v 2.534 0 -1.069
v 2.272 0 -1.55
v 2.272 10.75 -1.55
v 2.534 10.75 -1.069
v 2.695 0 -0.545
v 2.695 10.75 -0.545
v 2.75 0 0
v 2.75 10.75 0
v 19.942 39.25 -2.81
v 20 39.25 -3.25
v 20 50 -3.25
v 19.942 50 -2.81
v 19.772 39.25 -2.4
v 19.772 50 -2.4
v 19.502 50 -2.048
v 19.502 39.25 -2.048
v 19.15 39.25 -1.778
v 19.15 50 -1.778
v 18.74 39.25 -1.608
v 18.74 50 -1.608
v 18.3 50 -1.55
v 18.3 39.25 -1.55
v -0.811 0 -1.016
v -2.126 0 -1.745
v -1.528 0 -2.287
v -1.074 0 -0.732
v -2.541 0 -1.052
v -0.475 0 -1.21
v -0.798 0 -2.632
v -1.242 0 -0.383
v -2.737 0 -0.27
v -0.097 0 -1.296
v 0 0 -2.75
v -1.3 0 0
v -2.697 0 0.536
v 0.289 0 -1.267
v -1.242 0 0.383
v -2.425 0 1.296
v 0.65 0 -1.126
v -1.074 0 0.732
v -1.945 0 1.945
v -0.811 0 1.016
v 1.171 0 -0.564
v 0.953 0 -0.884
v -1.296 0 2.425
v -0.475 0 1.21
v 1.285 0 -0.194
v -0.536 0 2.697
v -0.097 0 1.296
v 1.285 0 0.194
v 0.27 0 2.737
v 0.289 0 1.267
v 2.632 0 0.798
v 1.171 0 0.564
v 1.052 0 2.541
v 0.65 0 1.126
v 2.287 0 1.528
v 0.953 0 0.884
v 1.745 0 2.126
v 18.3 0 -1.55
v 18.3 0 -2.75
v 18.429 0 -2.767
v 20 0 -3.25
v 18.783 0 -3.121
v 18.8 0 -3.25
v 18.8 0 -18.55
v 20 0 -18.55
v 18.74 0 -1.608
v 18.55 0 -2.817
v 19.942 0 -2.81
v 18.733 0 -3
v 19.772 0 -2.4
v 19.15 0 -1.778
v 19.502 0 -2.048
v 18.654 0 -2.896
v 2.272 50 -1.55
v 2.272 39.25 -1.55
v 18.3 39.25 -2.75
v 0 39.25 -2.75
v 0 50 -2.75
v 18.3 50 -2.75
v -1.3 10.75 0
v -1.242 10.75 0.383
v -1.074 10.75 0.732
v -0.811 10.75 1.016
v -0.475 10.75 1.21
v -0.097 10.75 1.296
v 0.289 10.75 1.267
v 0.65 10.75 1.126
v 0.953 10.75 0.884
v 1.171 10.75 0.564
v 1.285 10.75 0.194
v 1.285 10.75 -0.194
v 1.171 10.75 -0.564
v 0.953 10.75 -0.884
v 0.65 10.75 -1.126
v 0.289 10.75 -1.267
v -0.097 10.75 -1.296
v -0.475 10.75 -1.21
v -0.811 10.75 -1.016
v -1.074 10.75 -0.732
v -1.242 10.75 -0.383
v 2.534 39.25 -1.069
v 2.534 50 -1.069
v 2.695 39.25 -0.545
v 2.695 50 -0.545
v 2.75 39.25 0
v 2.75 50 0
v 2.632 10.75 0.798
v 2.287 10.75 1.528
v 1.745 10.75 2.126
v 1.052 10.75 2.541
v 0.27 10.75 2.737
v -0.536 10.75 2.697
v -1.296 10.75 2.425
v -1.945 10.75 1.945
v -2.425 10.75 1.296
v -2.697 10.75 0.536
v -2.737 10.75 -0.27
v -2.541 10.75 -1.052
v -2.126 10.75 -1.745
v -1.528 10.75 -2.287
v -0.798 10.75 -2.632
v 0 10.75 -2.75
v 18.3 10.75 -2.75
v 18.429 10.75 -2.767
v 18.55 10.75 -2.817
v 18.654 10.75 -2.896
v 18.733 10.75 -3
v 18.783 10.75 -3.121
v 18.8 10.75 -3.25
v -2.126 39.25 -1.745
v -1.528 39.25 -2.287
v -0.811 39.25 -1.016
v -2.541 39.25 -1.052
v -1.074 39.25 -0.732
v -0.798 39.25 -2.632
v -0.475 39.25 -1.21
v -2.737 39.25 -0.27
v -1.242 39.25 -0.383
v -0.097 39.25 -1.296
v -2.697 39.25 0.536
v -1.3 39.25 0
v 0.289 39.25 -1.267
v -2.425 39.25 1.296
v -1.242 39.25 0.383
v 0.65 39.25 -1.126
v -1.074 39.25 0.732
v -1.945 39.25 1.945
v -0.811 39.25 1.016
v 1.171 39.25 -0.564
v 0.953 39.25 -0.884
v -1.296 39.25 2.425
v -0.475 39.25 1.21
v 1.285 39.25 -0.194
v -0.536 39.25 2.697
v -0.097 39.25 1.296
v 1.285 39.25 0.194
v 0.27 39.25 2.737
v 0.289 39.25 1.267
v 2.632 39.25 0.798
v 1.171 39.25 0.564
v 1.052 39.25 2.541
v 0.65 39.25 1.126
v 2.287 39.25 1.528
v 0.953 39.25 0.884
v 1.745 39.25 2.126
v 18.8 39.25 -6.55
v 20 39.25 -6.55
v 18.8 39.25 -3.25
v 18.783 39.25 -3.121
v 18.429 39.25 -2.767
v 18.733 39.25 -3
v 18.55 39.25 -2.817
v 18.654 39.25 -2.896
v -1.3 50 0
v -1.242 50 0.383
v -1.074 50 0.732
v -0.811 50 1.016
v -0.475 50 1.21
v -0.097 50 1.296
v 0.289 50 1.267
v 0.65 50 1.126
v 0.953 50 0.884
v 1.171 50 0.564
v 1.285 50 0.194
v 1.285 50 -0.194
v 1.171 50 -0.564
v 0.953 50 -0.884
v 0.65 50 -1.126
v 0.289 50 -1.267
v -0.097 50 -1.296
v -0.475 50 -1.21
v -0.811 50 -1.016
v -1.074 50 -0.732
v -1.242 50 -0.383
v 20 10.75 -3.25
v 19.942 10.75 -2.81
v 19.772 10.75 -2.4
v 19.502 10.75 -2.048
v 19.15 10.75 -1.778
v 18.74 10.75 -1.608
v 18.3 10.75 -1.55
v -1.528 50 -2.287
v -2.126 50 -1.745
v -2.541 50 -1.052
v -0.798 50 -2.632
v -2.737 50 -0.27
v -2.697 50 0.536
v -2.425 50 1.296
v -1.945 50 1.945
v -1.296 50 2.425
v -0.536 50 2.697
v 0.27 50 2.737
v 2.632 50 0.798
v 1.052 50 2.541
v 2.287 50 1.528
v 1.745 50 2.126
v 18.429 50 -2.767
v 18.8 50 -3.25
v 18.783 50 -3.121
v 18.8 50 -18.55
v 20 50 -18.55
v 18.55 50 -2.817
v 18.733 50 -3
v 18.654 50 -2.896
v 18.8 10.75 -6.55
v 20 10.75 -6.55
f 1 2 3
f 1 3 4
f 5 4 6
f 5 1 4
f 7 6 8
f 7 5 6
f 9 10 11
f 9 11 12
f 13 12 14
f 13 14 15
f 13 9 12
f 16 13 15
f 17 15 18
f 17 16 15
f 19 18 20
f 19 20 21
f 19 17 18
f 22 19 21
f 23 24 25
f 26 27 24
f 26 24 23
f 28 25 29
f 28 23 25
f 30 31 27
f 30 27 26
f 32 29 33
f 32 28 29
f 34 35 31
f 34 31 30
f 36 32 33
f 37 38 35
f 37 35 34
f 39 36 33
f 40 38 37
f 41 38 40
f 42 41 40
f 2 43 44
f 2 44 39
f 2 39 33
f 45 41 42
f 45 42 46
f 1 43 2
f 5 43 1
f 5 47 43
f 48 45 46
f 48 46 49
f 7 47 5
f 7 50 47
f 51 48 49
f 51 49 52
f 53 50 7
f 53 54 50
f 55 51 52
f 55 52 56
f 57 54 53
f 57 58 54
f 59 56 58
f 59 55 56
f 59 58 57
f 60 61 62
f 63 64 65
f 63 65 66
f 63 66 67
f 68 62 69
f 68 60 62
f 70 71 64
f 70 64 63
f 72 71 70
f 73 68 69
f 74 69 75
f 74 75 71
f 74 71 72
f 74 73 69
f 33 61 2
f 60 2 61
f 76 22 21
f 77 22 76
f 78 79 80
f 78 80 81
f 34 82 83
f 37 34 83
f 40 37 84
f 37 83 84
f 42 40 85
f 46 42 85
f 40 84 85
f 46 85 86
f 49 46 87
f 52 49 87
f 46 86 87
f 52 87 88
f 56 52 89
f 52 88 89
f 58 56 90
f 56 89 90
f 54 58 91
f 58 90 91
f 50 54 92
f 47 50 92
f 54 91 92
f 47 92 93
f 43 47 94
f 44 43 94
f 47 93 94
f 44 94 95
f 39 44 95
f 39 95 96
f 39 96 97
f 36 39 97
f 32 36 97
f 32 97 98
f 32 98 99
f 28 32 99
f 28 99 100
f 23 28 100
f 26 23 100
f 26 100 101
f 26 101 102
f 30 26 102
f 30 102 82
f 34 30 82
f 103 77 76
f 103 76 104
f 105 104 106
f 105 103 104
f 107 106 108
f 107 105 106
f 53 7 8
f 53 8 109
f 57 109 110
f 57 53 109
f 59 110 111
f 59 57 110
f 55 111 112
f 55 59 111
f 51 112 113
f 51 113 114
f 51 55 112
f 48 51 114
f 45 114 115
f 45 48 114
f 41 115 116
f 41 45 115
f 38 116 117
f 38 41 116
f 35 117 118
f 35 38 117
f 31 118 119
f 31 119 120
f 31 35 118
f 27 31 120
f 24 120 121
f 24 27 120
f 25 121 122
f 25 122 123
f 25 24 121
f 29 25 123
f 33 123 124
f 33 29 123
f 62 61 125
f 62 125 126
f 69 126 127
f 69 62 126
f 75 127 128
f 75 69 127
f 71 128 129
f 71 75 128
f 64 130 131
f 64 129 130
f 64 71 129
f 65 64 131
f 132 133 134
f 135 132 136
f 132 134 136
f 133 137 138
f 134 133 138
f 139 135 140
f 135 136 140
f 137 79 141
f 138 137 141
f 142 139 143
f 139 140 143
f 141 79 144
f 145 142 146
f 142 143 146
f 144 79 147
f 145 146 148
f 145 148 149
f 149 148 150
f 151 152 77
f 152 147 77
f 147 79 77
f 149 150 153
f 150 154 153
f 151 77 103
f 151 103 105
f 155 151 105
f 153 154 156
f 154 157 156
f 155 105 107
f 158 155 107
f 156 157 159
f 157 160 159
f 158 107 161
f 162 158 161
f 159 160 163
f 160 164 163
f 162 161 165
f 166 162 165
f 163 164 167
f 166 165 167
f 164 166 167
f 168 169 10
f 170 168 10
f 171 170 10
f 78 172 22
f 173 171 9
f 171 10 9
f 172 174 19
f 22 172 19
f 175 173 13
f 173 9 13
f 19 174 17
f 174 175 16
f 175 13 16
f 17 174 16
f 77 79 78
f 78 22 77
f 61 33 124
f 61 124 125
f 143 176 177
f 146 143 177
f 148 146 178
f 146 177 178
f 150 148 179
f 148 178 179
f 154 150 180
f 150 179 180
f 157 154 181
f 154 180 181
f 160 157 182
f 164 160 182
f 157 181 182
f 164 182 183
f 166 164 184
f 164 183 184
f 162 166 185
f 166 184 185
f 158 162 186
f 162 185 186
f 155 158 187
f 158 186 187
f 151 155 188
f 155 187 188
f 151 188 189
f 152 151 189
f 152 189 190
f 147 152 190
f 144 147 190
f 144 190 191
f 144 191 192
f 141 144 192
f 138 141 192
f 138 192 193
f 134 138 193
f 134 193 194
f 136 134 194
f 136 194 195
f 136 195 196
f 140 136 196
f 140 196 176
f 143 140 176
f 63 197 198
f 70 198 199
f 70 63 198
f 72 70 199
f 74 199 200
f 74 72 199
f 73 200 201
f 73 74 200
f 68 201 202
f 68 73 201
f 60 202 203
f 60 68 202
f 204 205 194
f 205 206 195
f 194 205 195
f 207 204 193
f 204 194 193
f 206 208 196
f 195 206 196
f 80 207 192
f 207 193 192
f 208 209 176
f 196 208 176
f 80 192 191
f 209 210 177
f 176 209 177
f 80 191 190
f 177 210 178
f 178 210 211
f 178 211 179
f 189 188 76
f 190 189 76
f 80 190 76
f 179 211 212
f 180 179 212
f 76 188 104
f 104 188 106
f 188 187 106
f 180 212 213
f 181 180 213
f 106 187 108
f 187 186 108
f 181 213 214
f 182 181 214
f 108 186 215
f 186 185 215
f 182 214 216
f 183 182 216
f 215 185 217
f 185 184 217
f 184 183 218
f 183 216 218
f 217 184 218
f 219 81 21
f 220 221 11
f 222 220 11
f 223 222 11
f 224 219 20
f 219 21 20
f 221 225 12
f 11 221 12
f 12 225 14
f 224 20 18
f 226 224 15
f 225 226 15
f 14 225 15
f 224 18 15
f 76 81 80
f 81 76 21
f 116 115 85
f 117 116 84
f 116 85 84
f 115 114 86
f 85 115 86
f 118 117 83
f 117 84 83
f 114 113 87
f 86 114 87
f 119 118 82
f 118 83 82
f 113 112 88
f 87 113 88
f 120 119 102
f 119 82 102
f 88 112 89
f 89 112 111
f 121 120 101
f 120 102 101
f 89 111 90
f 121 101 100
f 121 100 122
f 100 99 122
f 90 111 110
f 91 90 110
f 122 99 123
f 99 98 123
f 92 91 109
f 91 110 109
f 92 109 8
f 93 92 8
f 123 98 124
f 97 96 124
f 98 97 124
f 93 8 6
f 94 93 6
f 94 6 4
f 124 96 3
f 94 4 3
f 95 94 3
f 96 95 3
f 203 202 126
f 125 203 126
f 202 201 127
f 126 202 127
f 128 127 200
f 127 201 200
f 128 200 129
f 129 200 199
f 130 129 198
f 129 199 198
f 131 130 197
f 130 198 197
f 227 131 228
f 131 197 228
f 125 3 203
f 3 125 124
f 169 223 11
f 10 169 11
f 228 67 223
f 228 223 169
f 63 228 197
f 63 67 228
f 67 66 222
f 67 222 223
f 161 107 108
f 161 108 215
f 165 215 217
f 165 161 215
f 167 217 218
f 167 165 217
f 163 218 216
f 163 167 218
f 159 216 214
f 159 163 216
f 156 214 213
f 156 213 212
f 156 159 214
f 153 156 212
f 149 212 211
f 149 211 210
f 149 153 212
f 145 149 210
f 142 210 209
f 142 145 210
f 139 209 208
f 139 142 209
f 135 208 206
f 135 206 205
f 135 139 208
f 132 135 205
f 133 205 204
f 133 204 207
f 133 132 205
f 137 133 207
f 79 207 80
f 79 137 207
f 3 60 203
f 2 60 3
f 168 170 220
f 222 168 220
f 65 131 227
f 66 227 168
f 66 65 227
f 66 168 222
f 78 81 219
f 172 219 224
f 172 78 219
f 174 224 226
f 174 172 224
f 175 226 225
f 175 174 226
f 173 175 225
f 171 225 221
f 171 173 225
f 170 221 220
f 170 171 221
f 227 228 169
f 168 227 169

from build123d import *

# Parameters (mm, degrees)
F1_DEPTH = 50
F2_D     = 2.6
F3_W     = 28.5
F3_H     = 6.7
F3_H_2   = 3.3
F4_DEPTH = 25


with BuildPart() as f1:
    # F0 (on Front) → F1 (new body)
    with BuildSketch(Plane.XZ):
        with BuildLine():
            ThreePointArc((2.2715633383, -1.55), (1.2845232579, -2.4315632832), (0, -2.75))
            Line((0, -2.75), (18.3, -2.75))
            ThreePointArc((18.3, -2.75), (18.6535533906, -2.8964466094), (18.8, -3.25))
            Line((18.8, -3.25), (18.8, -18.55))
            Line((18.8, -18.55), (20, -18.55))
            Line((20, -18.55), (20, -3.25))
            ThreePointArc((20, -3.25), (19.502081528, -2.047918472), (18.3, -1.55))
            Line((18.3, -1.55), (2.2715633383, -1.55))
        make_face()
        with BuildLine():
            ThreePointArc((2.2715633383, -1.55), (2.6276699926, -0.8110797802), (2.75, 0))
            ThreePointArc((2.75, 0), (-1.9445436483, 1.9445436483), (0, -2.75))
            ThreePointArc((0, -2.75), (1.2845232579, -2.4315632832), (2.2715633383, -1.55))
        make_face()
    extrude(amount=-F1_DEPTH)

    # F2 (through all)
    with Locations(Plane.XZ):
        with Locations((0, 0)):
            Hole(F2_D / 2)

    # F3 (on face) → F4 (cut)
    with BuildSketch(Plane.YZ.offset(20)):
        with Locations((25, 0.1)):
            Rectangle(F3_W, F3_H)
        with Locations((25, -4.9)):
            Rectangle(F3_W, F3_H_2)
    extrude(amount=-F4_DEPTH, mode=Mode.SUBTRACT)


solid = f1.part
